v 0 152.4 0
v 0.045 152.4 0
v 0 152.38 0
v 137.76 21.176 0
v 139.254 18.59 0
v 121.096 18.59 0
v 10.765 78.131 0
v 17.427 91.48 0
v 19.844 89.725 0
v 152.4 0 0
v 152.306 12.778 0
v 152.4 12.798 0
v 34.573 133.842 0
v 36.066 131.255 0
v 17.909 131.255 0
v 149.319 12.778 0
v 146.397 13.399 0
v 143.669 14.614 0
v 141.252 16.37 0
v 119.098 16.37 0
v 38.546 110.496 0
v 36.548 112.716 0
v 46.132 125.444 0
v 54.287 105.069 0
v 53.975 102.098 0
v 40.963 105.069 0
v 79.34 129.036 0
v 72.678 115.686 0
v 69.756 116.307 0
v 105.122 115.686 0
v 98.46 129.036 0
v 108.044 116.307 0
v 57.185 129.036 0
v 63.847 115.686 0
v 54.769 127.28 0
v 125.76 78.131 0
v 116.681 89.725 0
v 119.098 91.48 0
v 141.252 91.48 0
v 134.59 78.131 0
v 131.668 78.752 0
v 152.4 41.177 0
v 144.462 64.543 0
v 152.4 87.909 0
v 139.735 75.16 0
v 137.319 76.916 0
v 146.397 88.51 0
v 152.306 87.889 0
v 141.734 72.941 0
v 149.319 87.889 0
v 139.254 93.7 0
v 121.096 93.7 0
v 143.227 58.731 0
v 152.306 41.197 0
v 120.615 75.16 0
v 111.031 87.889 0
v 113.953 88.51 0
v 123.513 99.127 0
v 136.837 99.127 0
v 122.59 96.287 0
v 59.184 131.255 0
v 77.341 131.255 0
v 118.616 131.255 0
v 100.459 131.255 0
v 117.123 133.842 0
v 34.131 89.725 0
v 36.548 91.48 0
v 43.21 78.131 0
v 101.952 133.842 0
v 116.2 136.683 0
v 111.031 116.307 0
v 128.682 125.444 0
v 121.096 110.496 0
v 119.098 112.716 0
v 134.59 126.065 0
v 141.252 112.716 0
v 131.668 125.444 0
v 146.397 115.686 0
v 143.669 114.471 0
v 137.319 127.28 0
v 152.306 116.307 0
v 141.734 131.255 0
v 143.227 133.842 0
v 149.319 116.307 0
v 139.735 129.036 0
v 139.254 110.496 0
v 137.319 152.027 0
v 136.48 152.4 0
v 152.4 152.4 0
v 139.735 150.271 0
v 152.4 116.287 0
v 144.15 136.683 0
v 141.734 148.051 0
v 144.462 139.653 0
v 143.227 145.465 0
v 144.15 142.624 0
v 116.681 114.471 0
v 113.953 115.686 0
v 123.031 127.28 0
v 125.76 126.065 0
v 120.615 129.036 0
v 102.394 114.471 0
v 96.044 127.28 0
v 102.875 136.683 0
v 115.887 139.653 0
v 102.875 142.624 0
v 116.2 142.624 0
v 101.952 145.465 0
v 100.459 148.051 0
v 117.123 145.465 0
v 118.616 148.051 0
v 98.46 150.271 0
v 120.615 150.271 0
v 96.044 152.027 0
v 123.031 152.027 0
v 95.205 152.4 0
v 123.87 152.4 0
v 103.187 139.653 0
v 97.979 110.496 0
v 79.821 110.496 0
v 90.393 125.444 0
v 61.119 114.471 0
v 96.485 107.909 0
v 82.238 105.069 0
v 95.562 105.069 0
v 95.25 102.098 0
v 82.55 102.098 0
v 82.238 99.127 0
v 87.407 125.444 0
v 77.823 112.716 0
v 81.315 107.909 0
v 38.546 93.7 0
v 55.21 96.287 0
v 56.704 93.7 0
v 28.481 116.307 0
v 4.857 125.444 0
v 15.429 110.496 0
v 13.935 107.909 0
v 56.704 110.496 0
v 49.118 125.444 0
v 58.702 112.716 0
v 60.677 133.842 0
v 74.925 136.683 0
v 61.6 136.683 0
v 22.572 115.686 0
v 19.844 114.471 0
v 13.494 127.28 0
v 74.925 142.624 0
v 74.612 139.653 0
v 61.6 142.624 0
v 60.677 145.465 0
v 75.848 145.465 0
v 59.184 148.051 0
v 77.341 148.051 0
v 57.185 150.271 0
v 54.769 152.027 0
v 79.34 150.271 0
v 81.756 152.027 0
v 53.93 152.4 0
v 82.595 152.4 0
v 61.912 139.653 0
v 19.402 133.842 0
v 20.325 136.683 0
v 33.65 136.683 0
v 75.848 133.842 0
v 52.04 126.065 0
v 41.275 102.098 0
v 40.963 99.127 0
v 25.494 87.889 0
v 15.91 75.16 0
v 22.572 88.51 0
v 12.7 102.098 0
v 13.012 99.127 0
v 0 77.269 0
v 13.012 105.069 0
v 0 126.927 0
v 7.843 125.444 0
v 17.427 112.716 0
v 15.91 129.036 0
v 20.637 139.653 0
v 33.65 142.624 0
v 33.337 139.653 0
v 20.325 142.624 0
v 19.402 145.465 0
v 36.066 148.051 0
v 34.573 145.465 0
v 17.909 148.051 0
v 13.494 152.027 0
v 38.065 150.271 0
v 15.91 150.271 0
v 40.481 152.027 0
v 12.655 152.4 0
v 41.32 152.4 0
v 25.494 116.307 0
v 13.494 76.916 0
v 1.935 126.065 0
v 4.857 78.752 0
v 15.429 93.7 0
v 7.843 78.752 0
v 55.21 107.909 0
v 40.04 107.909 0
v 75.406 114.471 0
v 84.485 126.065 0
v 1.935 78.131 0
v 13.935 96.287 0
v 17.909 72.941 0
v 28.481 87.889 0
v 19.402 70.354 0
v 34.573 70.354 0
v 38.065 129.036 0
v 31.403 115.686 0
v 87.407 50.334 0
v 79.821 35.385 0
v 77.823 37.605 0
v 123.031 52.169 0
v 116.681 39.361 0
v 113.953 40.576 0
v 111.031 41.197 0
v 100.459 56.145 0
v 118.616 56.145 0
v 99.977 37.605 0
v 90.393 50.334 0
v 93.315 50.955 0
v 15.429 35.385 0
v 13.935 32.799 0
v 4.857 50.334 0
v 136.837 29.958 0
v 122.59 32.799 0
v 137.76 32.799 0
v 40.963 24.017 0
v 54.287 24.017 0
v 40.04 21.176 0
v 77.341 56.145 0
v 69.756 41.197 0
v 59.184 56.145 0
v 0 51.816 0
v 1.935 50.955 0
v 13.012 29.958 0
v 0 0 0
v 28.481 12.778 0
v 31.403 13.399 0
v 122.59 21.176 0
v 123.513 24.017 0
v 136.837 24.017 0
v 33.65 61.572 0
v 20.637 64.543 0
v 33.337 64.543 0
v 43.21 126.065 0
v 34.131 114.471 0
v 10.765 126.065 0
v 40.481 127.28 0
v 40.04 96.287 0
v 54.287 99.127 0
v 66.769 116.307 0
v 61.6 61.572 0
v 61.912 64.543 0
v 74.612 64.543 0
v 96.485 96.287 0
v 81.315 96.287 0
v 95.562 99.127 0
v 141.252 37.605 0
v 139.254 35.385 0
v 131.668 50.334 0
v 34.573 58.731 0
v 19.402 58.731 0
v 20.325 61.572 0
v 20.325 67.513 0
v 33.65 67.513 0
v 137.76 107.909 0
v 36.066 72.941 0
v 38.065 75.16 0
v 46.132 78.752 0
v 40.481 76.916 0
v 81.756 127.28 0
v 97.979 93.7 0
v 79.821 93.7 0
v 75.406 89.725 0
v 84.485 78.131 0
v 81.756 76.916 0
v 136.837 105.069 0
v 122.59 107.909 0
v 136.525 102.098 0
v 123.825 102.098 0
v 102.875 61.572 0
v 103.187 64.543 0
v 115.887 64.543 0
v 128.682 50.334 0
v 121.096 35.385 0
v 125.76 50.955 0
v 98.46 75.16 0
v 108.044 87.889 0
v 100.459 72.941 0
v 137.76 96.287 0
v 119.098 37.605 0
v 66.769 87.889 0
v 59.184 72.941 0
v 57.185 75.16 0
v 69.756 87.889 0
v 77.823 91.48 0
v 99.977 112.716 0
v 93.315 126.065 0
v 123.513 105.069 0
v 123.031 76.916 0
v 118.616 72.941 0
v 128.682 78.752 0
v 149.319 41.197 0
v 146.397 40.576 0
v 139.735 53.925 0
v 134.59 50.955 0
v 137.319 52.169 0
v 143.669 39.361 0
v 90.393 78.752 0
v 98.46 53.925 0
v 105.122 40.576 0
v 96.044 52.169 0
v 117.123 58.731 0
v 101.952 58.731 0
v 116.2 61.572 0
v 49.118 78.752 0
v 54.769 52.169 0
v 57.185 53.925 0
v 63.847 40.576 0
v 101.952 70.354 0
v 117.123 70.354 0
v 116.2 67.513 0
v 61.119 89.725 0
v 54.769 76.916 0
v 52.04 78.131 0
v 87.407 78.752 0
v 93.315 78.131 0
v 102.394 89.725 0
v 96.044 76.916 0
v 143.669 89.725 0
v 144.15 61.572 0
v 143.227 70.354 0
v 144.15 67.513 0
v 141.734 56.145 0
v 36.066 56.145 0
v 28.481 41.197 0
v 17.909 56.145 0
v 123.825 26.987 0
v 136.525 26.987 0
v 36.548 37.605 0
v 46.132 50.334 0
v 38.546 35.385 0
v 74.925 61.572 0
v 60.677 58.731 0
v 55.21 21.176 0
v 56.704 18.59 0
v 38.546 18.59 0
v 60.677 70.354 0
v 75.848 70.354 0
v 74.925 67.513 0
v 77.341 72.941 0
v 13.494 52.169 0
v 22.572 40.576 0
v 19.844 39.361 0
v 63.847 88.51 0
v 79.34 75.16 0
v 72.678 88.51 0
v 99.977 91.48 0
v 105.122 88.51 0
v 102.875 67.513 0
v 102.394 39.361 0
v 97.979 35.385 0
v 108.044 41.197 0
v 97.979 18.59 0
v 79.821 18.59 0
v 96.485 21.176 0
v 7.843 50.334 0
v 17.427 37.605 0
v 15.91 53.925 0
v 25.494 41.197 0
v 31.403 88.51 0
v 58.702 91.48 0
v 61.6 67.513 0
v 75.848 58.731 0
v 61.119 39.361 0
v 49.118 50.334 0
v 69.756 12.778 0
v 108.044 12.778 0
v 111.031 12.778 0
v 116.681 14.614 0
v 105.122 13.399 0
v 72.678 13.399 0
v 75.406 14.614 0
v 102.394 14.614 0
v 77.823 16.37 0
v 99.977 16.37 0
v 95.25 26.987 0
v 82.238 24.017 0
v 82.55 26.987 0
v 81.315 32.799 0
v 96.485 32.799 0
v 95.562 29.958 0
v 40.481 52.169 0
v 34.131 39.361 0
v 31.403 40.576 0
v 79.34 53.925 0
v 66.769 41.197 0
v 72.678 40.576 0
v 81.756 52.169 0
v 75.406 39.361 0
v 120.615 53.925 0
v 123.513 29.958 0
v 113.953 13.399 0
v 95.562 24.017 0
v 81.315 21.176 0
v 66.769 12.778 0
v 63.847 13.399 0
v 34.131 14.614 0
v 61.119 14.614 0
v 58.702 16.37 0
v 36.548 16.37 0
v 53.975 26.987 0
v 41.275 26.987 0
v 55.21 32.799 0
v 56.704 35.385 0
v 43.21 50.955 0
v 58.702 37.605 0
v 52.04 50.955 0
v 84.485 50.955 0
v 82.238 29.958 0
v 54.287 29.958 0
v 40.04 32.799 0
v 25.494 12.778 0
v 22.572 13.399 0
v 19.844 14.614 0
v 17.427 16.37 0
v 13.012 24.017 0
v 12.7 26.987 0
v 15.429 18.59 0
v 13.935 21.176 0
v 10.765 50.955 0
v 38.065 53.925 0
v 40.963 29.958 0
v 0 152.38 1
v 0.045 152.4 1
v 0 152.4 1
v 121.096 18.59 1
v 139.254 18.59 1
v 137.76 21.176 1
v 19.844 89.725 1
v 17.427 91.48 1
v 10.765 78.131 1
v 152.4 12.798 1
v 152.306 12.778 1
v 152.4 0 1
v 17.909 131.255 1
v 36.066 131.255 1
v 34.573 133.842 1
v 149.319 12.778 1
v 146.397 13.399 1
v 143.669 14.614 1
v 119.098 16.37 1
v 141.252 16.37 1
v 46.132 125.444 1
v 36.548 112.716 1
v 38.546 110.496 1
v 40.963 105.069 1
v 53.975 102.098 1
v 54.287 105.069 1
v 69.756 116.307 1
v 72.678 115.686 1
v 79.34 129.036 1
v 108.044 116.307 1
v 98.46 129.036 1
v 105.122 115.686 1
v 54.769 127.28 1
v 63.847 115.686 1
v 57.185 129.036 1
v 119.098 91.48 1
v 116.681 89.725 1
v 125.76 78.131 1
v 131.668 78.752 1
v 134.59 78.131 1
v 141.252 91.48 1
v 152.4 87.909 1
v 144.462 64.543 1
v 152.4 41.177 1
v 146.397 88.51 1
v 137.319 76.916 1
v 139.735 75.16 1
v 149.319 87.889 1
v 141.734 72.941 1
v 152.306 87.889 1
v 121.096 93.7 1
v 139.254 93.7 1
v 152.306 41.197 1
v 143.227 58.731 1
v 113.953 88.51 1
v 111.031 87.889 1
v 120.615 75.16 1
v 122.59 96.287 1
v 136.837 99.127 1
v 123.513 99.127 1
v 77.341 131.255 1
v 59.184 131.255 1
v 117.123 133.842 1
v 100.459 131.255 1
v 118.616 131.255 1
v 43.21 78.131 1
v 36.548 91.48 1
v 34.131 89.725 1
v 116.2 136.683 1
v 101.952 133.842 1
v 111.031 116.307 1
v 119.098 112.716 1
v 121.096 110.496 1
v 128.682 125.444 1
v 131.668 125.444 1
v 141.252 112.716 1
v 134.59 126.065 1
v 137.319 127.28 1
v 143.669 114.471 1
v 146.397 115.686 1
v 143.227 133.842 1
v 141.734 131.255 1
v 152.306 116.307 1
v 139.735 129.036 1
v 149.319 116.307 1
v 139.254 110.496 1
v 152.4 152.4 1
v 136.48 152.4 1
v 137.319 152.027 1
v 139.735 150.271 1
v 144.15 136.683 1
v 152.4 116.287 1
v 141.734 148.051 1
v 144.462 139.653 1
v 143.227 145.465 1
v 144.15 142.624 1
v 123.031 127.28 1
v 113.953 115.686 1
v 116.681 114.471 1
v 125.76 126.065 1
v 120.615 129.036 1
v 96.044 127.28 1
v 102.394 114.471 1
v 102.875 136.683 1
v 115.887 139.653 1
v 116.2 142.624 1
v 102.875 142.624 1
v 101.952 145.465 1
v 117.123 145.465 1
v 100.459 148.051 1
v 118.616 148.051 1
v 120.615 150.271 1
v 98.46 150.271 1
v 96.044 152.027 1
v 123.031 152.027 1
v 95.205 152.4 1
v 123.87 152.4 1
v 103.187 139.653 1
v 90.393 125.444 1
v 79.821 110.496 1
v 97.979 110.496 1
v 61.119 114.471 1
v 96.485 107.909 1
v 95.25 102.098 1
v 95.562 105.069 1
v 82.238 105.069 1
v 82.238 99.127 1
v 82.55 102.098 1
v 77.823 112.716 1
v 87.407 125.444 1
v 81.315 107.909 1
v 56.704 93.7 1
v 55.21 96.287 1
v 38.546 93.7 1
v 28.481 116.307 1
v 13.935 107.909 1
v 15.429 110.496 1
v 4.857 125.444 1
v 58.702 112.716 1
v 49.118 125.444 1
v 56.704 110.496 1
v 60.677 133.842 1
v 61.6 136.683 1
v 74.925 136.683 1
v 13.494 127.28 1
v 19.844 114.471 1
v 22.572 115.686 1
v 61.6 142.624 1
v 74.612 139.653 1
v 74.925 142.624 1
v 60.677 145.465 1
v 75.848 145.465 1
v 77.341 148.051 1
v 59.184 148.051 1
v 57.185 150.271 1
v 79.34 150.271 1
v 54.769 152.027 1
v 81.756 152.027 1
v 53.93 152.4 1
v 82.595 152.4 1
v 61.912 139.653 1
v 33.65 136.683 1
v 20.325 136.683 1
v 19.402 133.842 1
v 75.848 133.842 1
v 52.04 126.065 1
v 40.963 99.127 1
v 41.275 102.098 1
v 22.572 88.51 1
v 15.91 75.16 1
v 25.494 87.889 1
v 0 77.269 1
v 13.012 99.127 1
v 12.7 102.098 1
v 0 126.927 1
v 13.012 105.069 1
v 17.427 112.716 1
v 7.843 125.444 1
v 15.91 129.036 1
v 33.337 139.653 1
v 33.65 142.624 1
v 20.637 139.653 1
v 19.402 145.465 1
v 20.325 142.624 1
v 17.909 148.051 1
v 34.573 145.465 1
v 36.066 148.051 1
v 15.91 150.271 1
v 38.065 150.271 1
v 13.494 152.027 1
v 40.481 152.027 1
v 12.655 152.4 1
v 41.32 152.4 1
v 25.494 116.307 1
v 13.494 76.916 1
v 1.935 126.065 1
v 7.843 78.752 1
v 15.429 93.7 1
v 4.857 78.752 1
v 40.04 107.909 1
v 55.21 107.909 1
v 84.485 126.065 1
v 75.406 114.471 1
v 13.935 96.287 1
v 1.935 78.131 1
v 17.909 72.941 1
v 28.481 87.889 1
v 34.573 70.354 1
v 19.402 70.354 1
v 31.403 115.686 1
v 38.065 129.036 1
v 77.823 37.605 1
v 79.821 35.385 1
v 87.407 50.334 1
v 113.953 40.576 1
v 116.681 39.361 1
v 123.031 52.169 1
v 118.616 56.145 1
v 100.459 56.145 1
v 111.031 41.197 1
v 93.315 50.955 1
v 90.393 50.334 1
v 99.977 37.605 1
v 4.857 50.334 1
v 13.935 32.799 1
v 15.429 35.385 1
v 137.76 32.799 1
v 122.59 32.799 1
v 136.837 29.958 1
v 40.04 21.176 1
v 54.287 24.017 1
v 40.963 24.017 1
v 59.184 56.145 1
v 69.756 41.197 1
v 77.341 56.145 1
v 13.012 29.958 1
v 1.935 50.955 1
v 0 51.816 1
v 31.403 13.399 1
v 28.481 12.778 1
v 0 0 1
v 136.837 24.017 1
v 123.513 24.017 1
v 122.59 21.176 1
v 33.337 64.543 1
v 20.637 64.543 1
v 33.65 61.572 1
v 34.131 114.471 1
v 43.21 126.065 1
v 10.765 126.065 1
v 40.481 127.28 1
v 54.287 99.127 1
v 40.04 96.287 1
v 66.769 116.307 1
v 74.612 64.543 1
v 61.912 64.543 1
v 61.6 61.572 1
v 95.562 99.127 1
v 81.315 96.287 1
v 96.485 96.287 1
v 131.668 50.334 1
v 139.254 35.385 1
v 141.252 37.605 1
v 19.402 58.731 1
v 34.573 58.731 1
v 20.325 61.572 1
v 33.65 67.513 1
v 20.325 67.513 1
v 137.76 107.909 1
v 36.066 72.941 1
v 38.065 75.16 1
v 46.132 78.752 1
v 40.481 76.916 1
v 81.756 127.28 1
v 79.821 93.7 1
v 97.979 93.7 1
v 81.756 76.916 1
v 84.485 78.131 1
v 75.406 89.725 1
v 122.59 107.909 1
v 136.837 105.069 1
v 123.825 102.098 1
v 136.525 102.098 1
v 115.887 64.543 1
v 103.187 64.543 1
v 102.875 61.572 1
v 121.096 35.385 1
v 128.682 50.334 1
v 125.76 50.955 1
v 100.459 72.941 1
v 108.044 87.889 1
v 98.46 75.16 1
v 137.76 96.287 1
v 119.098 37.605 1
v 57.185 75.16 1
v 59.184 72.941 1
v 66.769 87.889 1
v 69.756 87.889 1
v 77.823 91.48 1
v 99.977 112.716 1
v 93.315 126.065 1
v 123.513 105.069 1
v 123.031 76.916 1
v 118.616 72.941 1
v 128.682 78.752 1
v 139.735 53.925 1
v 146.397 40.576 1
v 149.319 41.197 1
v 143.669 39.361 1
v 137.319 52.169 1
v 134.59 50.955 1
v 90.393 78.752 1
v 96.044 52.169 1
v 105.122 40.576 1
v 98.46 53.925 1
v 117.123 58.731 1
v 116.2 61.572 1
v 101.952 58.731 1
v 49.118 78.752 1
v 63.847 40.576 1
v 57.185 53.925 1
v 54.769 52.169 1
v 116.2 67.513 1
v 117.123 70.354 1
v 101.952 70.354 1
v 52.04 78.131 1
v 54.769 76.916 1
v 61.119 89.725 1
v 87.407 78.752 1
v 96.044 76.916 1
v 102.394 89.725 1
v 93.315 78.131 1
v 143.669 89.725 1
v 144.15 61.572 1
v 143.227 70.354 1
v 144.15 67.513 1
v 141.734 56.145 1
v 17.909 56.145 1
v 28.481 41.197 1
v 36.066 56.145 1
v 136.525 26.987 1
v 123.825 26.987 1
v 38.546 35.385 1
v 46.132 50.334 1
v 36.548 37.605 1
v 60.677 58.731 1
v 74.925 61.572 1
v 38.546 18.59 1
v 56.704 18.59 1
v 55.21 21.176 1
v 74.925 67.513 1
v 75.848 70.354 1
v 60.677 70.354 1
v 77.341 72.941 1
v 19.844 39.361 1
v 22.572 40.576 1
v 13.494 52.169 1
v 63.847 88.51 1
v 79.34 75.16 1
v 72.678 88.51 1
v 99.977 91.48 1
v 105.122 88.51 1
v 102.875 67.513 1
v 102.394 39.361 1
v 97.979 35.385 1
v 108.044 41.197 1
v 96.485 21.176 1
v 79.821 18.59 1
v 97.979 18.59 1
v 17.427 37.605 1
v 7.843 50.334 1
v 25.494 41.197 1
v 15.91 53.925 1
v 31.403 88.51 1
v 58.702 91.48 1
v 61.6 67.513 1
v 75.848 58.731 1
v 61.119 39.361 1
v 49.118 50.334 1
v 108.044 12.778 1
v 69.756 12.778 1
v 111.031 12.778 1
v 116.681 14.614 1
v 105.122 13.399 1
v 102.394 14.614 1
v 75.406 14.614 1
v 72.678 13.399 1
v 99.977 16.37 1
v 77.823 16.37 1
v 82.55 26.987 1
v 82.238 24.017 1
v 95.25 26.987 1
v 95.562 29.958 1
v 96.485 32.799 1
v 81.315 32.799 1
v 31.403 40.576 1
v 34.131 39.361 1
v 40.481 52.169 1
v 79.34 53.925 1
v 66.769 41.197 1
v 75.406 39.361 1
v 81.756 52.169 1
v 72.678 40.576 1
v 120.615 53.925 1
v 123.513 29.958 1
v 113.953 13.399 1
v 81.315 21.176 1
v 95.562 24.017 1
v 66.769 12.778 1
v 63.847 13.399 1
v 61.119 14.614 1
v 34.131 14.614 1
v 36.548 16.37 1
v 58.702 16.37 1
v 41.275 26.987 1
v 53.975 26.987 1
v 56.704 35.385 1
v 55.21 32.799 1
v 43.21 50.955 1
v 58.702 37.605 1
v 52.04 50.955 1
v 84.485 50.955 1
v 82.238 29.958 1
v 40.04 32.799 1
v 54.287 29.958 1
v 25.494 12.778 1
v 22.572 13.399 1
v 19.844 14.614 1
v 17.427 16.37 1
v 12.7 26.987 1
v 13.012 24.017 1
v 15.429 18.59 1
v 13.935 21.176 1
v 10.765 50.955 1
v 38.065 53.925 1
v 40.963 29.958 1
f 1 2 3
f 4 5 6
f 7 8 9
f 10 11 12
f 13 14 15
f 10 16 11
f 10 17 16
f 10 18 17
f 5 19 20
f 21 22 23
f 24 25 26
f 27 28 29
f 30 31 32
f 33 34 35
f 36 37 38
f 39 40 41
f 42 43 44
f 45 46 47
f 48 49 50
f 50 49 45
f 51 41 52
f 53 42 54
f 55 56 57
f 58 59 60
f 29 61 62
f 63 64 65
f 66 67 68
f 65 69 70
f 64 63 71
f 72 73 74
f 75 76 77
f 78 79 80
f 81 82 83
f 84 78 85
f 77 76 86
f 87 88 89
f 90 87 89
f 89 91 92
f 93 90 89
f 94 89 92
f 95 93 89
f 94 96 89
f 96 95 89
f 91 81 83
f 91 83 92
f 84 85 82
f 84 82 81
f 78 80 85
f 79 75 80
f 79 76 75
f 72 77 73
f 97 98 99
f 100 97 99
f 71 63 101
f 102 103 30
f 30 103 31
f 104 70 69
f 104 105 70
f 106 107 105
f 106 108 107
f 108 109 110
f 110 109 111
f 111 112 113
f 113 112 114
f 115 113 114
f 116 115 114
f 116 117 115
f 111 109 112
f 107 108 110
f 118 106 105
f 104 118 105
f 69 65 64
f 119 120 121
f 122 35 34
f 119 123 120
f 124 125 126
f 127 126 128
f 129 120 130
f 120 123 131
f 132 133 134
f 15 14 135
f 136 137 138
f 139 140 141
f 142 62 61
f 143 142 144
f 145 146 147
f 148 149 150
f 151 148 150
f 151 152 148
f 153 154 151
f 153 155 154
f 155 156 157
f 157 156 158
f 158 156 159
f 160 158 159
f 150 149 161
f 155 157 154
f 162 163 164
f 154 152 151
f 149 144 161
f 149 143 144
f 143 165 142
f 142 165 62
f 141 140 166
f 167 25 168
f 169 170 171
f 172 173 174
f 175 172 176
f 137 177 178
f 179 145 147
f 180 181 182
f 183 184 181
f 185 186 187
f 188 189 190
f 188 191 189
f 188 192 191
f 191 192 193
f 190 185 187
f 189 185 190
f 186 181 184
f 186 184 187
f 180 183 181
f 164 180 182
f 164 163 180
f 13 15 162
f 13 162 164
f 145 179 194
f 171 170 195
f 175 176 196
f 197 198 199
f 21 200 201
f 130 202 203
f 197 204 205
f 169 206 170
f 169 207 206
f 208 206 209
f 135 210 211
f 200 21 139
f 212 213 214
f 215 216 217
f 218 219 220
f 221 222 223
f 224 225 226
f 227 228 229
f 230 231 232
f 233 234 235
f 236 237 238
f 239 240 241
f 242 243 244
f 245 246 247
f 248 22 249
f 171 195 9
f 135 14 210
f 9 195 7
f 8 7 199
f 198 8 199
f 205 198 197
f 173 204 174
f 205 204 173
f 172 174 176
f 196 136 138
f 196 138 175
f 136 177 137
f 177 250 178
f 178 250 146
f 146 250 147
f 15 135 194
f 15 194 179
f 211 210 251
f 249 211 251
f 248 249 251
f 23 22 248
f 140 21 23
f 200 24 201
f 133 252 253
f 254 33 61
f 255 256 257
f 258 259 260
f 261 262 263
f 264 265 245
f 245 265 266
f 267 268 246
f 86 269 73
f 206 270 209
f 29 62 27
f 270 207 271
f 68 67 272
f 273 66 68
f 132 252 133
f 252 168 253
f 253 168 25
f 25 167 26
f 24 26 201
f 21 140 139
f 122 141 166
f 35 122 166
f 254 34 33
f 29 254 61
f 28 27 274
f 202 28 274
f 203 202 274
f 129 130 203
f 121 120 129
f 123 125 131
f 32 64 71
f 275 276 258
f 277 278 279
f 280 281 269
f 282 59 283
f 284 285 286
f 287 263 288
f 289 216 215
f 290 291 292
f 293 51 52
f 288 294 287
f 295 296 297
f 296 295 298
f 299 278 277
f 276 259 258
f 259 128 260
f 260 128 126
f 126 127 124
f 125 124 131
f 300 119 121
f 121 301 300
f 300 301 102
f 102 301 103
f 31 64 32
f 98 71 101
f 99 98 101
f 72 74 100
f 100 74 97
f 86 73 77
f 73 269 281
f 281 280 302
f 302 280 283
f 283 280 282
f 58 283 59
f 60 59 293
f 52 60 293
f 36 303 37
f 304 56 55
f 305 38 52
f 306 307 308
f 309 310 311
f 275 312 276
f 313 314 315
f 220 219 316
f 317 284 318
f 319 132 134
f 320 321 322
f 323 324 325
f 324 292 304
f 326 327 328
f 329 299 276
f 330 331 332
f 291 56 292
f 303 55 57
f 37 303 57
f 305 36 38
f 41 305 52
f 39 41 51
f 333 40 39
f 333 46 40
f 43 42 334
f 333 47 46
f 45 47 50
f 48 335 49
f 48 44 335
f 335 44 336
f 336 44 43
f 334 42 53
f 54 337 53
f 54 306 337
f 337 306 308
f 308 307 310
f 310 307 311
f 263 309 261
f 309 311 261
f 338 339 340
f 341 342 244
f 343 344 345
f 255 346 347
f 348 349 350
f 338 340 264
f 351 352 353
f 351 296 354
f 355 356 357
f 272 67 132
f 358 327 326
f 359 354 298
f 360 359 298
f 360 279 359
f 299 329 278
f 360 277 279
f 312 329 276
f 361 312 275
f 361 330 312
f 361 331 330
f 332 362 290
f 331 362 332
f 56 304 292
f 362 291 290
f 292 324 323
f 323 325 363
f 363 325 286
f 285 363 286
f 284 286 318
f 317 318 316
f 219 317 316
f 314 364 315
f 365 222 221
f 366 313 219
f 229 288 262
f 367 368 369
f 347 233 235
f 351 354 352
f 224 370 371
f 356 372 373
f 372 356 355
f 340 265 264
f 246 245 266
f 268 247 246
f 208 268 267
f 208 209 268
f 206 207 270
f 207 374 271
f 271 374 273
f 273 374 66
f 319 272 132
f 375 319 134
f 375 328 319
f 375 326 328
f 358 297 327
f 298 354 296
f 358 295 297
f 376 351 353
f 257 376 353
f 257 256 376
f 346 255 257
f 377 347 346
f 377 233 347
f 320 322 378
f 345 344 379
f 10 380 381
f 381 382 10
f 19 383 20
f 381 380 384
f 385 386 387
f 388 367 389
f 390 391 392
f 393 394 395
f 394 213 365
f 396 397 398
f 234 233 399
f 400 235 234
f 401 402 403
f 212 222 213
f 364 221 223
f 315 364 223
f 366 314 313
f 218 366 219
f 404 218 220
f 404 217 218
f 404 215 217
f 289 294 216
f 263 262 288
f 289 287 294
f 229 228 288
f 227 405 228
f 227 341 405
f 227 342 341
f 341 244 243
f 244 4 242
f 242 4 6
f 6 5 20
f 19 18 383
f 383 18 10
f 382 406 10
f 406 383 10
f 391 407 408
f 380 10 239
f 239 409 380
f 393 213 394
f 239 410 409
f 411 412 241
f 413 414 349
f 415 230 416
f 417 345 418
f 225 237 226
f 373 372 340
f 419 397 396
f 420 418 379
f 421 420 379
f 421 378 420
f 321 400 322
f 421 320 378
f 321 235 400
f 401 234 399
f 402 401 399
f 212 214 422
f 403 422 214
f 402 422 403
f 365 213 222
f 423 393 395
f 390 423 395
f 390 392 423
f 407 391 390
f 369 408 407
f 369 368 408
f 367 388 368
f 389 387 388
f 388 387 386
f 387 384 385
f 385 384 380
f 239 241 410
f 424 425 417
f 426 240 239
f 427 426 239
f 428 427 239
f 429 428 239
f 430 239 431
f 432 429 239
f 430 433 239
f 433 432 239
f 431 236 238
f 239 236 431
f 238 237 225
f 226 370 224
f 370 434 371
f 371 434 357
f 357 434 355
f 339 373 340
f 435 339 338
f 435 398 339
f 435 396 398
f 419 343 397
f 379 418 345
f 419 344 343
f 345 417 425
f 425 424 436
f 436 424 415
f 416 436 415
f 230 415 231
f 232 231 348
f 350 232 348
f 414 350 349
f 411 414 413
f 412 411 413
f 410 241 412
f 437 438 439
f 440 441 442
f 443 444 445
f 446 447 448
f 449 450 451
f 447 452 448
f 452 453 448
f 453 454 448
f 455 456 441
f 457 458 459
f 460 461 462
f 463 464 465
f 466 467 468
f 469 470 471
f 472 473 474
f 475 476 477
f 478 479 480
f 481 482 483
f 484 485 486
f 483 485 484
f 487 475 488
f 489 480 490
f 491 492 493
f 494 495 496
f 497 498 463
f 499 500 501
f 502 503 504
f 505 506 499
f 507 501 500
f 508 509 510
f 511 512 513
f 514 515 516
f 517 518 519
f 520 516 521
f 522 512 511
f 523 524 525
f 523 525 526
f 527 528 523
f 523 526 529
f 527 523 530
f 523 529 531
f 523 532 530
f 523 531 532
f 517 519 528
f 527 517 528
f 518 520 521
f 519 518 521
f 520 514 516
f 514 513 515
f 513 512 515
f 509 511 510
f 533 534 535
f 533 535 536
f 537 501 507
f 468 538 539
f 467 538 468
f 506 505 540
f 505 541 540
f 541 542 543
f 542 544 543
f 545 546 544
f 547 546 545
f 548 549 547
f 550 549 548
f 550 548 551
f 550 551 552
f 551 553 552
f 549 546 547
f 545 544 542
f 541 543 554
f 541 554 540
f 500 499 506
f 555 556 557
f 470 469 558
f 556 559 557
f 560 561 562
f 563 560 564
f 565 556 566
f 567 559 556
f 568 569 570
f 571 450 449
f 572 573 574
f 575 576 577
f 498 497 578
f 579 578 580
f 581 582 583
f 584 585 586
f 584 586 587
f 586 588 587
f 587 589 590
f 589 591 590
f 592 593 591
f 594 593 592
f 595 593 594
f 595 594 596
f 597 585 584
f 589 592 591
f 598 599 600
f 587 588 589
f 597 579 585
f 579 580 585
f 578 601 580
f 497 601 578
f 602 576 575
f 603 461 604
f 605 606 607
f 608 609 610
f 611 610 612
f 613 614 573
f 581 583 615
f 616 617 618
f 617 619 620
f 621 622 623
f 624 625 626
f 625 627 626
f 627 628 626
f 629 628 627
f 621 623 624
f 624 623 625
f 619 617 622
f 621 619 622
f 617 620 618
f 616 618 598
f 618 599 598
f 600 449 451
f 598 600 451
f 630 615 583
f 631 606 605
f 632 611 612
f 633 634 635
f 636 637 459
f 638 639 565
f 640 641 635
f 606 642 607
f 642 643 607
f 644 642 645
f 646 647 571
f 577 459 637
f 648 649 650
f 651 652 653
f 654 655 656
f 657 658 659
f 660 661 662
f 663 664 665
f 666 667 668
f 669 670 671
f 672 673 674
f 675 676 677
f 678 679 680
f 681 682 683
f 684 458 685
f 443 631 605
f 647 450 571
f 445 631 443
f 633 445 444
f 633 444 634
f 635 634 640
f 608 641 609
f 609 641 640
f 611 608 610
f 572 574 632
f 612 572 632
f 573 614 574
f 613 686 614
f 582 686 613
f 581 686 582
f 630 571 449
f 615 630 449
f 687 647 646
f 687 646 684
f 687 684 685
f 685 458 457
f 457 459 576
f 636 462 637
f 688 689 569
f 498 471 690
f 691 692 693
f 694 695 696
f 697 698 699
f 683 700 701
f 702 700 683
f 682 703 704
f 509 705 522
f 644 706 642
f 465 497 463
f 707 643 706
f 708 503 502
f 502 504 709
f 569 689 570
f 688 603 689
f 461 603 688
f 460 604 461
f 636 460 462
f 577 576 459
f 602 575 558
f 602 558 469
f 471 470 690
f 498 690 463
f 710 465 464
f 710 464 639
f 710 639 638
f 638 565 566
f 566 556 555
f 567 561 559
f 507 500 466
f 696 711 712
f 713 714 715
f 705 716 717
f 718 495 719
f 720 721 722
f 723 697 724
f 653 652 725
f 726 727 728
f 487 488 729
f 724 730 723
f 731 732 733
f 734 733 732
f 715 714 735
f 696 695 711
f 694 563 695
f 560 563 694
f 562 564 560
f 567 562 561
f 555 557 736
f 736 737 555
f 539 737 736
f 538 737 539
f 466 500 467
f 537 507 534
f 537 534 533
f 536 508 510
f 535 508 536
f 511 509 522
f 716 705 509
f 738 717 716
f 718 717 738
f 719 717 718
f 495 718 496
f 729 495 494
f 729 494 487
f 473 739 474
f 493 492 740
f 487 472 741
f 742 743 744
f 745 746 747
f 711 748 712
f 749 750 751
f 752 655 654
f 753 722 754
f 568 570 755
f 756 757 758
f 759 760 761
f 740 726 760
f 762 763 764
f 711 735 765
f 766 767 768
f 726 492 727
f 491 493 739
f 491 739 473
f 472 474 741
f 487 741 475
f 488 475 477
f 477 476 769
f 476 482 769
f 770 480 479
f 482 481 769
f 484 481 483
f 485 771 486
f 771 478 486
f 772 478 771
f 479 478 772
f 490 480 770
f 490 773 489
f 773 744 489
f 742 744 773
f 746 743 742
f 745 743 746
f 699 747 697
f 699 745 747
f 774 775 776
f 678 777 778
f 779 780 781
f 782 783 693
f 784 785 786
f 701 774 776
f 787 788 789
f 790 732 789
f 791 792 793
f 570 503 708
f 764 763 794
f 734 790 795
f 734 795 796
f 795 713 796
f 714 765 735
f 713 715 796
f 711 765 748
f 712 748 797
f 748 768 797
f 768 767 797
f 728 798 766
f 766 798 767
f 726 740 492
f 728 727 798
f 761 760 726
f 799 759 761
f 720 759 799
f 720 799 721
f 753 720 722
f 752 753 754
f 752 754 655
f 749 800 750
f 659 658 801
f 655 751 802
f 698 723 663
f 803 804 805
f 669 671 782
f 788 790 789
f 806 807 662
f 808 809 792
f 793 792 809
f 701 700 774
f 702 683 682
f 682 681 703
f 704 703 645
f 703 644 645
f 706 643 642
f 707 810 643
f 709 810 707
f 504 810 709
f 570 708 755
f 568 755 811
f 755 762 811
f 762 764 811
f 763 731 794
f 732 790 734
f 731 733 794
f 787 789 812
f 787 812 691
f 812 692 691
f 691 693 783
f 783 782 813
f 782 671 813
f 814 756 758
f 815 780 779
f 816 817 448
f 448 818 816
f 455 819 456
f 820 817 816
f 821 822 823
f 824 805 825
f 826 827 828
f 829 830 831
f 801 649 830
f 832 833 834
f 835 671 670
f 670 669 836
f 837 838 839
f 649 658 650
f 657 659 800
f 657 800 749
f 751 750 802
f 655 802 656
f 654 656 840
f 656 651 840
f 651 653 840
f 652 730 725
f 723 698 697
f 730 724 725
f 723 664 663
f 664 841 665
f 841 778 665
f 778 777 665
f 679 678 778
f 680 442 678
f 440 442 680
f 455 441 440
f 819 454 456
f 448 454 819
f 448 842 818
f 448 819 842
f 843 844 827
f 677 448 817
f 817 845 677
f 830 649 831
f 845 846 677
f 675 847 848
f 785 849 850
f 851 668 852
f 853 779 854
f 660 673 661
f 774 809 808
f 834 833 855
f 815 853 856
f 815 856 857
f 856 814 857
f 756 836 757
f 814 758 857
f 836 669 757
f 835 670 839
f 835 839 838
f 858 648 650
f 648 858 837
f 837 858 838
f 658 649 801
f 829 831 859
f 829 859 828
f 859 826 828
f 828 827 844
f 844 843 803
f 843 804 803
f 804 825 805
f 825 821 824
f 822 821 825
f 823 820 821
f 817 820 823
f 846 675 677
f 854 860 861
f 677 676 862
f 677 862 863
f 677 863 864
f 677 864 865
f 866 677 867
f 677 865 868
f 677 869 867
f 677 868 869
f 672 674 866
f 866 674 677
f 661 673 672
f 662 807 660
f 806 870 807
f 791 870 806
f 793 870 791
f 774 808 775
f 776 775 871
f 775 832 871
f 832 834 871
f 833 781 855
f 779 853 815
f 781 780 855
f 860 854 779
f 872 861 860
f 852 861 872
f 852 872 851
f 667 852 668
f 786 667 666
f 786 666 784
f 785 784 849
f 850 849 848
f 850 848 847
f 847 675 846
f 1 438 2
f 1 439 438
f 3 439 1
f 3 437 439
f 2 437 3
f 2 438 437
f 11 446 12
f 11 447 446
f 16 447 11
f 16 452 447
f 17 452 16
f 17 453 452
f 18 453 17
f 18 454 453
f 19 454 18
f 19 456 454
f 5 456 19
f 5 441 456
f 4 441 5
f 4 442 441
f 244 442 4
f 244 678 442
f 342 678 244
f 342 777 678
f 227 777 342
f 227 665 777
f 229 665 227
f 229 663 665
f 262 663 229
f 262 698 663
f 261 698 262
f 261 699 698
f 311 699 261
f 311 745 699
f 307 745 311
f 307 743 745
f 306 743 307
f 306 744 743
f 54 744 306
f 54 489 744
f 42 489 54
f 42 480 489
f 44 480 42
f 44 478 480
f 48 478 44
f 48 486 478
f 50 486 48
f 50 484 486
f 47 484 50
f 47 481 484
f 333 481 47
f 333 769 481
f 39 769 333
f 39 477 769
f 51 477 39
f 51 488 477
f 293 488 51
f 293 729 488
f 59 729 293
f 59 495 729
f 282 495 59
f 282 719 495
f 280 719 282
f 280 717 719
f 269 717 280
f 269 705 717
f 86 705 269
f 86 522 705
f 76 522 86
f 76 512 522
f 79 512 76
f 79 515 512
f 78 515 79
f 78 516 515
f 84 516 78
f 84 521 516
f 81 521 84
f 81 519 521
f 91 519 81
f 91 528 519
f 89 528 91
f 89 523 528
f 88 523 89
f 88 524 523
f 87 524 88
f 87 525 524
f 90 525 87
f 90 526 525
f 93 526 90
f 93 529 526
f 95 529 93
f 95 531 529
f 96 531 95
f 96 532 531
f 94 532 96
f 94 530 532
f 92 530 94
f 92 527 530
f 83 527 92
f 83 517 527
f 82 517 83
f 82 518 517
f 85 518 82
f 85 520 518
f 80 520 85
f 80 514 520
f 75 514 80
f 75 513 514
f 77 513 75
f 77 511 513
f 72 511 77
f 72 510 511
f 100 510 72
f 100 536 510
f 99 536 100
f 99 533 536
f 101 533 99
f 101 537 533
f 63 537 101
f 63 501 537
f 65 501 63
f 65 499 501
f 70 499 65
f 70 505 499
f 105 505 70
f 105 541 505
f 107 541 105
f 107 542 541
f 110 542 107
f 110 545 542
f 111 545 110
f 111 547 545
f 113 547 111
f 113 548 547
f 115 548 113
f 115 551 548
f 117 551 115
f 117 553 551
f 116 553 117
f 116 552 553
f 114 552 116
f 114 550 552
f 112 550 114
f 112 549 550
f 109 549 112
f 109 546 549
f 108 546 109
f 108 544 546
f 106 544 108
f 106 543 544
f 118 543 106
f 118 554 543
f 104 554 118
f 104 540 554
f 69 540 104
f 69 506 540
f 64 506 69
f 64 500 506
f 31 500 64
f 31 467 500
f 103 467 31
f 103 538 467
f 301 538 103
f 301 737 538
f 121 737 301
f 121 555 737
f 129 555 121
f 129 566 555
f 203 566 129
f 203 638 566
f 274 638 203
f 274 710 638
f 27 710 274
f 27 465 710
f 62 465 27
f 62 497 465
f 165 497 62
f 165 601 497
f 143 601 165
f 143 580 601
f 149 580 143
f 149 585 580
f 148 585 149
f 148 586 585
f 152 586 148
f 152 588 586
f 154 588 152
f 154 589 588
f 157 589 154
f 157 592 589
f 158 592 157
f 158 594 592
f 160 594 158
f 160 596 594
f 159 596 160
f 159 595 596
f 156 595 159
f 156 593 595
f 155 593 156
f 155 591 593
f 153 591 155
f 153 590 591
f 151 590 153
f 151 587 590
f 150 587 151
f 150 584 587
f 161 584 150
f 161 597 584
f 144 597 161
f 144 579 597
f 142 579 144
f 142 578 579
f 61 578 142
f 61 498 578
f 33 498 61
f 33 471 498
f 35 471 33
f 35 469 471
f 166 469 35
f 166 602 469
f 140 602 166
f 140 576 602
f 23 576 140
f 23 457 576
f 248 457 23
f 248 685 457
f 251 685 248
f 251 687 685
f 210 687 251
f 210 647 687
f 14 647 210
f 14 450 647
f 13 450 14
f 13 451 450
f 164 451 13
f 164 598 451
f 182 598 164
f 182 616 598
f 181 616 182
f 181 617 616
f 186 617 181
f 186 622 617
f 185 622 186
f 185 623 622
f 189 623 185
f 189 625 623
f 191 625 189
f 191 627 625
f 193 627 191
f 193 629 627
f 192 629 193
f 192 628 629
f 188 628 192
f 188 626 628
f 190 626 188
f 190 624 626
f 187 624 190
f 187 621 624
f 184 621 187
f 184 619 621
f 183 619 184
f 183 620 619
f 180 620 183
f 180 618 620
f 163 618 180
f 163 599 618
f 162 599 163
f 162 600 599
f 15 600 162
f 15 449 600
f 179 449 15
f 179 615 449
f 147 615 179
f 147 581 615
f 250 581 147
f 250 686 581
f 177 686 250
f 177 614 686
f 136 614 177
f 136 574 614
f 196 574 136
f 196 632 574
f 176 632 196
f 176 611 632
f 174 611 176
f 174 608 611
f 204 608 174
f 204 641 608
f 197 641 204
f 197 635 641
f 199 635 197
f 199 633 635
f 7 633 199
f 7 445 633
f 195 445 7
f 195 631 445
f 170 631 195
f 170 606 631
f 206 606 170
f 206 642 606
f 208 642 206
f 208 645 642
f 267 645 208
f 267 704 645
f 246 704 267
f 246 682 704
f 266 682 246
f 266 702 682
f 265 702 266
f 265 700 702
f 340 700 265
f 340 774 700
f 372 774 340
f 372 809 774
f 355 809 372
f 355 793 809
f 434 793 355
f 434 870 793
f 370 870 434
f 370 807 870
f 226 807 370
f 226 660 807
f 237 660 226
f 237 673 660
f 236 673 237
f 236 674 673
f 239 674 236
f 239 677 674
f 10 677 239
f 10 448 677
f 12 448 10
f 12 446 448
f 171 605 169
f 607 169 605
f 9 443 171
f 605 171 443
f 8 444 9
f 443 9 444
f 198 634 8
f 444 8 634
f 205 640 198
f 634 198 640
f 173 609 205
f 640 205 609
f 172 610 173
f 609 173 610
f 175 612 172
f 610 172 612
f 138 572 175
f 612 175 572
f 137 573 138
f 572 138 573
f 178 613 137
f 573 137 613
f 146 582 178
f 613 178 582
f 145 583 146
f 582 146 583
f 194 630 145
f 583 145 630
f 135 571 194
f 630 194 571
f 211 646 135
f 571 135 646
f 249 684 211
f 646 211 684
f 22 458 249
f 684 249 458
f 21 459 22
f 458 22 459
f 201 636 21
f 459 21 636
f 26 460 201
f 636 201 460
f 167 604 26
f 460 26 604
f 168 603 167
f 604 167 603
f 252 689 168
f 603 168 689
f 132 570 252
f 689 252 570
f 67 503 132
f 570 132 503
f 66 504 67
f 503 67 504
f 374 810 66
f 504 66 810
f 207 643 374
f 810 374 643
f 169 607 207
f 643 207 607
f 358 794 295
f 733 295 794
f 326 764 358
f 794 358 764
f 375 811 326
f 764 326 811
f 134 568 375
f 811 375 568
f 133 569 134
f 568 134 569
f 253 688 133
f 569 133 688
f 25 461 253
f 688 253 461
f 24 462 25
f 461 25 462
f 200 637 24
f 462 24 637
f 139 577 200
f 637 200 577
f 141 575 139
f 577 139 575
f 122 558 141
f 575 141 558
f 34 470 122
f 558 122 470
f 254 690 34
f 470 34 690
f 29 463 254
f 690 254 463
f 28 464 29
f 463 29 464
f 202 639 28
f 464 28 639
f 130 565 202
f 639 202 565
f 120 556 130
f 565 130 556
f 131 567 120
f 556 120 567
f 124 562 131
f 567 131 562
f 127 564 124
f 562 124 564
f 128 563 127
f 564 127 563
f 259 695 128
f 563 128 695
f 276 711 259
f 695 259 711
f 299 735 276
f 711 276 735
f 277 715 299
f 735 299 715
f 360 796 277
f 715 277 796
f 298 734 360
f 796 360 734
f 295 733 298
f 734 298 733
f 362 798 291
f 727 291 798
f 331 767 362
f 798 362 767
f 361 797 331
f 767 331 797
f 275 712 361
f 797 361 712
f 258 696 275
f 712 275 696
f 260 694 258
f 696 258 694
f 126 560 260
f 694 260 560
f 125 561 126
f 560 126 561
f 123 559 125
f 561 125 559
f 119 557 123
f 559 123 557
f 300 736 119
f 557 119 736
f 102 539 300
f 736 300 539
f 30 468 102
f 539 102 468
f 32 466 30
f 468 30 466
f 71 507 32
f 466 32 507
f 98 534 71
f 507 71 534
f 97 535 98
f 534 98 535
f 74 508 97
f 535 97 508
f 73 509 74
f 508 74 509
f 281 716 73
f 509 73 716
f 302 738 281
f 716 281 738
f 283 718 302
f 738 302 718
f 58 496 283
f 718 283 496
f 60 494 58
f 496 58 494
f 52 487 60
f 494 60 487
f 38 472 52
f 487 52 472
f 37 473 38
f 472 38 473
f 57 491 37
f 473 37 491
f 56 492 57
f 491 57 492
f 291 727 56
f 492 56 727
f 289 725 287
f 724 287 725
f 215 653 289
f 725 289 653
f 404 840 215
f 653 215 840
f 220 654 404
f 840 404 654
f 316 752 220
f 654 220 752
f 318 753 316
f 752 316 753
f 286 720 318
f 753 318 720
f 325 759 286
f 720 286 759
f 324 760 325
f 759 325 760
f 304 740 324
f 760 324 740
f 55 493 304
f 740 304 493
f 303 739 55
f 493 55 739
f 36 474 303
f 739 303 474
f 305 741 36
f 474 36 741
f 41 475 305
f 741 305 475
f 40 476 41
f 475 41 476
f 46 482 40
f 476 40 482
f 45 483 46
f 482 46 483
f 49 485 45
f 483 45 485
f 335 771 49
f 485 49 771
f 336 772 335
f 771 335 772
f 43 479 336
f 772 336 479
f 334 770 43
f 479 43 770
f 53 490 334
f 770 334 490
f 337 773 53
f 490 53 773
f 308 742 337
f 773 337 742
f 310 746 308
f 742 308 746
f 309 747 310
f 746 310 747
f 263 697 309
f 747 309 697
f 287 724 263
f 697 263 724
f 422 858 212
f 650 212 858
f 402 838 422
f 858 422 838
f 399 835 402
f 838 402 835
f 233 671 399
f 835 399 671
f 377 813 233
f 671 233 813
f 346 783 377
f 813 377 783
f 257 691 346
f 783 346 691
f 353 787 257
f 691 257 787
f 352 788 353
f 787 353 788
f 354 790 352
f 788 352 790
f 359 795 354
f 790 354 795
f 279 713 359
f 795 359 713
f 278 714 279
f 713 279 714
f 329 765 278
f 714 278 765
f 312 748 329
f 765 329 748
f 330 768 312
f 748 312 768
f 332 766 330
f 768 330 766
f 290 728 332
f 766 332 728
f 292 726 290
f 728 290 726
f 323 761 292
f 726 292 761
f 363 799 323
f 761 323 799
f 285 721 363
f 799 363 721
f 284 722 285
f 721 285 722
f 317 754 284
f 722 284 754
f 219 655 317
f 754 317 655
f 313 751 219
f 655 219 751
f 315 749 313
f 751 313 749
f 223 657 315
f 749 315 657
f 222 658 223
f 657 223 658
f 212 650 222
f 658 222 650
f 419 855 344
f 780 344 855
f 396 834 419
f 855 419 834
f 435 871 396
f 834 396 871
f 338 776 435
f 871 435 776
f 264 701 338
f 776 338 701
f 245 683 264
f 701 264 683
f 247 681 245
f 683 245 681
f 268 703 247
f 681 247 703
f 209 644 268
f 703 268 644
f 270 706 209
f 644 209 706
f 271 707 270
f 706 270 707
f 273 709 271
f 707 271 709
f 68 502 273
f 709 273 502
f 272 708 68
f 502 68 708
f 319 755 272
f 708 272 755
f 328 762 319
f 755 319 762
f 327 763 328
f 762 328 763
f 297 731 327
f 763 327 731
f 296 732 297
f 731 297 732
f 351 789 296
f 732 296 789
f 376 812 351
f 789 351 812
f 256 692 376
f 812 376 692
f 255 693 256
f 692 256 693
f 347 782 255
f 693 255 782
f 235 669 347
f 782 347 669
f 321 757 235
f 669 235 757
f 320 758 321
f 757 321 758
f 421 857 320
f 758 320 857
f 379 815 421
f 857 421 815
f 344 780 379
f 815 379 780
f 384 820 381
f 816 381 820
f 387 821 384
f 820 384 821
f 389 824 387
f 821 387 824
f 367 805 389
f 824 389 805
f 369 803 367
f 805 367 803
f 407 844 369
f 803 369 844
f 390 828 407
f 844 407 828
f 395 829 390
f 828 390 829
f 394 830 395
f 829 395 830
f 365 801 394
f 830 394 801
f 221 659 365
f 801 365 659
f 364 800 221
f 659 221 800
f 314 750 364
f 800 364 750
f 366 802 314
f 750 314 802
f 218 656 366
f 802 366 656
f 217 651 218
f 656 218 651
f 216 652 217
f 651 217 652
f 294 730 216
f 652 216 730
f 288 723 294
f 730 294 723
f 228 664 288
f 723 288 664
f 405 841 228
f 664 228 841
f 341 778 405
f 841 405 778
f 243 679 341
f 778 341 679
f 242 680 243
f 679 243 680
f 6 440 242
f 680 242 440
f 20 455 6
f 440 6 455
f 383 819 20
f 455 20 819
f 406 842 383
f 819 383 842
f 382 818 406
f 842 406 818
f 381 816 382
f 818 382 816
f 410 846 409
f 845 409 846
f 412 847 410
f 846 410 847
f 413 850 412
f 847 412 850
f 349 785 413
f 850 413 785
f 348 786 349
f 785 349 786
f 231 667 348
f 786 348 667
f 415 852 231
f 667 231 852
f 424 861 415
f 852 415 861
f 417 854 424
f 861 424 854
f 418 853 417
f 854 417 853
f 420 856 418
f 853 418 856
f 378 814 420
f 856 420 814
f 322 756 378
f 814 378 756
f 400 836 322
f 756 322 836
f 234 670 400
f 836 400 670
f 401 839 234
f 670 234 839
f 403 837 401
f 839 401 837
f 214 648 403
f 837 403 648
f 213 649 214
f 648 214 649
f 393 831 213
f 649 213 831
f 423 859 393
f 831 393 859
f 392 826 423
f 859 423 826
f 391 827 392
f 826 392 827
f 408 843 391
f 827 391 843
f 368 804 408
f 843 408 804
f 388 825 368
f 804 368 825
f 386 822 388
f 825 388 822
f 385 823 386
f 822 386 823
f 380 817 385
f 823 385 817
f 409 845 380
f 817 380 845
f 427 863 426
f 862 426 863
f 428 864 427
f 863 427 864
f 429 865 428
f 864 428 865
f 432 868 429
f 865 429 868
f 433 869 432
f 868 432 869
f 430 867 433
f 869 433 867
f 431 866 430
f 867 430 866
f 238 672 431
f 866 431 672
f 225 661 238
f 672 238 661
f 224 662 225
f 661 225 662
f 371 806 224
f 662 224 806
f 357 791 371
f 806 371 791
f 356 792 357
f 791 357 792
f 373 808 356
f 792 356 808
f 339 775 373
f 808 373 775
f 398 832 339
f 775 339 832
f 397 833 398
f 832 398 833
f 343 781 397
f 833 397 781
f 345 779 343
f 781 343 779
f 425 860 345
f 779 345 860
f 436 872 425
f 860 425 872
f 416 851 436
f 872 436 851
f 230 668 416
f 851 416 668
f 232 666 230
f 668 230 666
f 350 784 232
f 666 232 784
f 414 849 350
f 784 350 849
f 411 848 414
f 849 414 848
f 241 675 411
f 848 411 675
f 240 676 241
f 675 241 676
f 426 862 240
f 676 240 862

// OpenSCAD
//Giant LiteBrite offset grid, distance from holes is 1/2.
// Defined in mm but, set for Imperial

//*******  Setup  *******
//Template Size
templateSizeX = 152.4; // 6" 
//templateSizeX = 609.6; // 2'
templateSizeY = 152.4; // 6"
//templateSizeY = 1219.2; // 4'
templateThickness = 1; 

//HoleSize and Spacing
holeSize = 28.575;  // 1-1/8" 
xSpacing = 12.7; // 1/2"
offsetSpacing = 12.7;  //Distance from the holes in the next row (think 45 degree angle). 1/2"

//***********************


ySpacing = offsetSpacing*sin(45); 

//On Center Intervals
startingX = xSpacing + holeSize/2;
intervalX = xSpacing + holeSize;
//offsetStartingX = xSpacing + holeSize/2;
offsetStartingX = -(holeSize/2);

startingY = offsetSpacing + holeSize/2;
shortIntervalY = ySpacing + holeSize;
normIntervalY = offsetSpacing + holeSize;

linear_extrude(height = templateThickness)
{
	difference()
	{
		square([templateSizeX,templateSizeY]);
            
        echo("Normal Rows");
		for(y = [startingY:(shortIntervalY*2):templateSizeY])
        {
            for(x = [startingX:intervalX:templateSizeX])
				{translate([x,y])circle(d=holeSize);}
            echo(y);
        }
        
        echo("Offset Rows");
		for(y = [(startingY+shortIntervalY):(shortIntervalY*2):templateSizeY])
        {
            for(x = [offsetStartingX+(intervalX/2):intervalX:templateSizeX])
                   {translate([x,y])circle(d=holeSize);}
            echo(y);
        }	
	}

}
	
